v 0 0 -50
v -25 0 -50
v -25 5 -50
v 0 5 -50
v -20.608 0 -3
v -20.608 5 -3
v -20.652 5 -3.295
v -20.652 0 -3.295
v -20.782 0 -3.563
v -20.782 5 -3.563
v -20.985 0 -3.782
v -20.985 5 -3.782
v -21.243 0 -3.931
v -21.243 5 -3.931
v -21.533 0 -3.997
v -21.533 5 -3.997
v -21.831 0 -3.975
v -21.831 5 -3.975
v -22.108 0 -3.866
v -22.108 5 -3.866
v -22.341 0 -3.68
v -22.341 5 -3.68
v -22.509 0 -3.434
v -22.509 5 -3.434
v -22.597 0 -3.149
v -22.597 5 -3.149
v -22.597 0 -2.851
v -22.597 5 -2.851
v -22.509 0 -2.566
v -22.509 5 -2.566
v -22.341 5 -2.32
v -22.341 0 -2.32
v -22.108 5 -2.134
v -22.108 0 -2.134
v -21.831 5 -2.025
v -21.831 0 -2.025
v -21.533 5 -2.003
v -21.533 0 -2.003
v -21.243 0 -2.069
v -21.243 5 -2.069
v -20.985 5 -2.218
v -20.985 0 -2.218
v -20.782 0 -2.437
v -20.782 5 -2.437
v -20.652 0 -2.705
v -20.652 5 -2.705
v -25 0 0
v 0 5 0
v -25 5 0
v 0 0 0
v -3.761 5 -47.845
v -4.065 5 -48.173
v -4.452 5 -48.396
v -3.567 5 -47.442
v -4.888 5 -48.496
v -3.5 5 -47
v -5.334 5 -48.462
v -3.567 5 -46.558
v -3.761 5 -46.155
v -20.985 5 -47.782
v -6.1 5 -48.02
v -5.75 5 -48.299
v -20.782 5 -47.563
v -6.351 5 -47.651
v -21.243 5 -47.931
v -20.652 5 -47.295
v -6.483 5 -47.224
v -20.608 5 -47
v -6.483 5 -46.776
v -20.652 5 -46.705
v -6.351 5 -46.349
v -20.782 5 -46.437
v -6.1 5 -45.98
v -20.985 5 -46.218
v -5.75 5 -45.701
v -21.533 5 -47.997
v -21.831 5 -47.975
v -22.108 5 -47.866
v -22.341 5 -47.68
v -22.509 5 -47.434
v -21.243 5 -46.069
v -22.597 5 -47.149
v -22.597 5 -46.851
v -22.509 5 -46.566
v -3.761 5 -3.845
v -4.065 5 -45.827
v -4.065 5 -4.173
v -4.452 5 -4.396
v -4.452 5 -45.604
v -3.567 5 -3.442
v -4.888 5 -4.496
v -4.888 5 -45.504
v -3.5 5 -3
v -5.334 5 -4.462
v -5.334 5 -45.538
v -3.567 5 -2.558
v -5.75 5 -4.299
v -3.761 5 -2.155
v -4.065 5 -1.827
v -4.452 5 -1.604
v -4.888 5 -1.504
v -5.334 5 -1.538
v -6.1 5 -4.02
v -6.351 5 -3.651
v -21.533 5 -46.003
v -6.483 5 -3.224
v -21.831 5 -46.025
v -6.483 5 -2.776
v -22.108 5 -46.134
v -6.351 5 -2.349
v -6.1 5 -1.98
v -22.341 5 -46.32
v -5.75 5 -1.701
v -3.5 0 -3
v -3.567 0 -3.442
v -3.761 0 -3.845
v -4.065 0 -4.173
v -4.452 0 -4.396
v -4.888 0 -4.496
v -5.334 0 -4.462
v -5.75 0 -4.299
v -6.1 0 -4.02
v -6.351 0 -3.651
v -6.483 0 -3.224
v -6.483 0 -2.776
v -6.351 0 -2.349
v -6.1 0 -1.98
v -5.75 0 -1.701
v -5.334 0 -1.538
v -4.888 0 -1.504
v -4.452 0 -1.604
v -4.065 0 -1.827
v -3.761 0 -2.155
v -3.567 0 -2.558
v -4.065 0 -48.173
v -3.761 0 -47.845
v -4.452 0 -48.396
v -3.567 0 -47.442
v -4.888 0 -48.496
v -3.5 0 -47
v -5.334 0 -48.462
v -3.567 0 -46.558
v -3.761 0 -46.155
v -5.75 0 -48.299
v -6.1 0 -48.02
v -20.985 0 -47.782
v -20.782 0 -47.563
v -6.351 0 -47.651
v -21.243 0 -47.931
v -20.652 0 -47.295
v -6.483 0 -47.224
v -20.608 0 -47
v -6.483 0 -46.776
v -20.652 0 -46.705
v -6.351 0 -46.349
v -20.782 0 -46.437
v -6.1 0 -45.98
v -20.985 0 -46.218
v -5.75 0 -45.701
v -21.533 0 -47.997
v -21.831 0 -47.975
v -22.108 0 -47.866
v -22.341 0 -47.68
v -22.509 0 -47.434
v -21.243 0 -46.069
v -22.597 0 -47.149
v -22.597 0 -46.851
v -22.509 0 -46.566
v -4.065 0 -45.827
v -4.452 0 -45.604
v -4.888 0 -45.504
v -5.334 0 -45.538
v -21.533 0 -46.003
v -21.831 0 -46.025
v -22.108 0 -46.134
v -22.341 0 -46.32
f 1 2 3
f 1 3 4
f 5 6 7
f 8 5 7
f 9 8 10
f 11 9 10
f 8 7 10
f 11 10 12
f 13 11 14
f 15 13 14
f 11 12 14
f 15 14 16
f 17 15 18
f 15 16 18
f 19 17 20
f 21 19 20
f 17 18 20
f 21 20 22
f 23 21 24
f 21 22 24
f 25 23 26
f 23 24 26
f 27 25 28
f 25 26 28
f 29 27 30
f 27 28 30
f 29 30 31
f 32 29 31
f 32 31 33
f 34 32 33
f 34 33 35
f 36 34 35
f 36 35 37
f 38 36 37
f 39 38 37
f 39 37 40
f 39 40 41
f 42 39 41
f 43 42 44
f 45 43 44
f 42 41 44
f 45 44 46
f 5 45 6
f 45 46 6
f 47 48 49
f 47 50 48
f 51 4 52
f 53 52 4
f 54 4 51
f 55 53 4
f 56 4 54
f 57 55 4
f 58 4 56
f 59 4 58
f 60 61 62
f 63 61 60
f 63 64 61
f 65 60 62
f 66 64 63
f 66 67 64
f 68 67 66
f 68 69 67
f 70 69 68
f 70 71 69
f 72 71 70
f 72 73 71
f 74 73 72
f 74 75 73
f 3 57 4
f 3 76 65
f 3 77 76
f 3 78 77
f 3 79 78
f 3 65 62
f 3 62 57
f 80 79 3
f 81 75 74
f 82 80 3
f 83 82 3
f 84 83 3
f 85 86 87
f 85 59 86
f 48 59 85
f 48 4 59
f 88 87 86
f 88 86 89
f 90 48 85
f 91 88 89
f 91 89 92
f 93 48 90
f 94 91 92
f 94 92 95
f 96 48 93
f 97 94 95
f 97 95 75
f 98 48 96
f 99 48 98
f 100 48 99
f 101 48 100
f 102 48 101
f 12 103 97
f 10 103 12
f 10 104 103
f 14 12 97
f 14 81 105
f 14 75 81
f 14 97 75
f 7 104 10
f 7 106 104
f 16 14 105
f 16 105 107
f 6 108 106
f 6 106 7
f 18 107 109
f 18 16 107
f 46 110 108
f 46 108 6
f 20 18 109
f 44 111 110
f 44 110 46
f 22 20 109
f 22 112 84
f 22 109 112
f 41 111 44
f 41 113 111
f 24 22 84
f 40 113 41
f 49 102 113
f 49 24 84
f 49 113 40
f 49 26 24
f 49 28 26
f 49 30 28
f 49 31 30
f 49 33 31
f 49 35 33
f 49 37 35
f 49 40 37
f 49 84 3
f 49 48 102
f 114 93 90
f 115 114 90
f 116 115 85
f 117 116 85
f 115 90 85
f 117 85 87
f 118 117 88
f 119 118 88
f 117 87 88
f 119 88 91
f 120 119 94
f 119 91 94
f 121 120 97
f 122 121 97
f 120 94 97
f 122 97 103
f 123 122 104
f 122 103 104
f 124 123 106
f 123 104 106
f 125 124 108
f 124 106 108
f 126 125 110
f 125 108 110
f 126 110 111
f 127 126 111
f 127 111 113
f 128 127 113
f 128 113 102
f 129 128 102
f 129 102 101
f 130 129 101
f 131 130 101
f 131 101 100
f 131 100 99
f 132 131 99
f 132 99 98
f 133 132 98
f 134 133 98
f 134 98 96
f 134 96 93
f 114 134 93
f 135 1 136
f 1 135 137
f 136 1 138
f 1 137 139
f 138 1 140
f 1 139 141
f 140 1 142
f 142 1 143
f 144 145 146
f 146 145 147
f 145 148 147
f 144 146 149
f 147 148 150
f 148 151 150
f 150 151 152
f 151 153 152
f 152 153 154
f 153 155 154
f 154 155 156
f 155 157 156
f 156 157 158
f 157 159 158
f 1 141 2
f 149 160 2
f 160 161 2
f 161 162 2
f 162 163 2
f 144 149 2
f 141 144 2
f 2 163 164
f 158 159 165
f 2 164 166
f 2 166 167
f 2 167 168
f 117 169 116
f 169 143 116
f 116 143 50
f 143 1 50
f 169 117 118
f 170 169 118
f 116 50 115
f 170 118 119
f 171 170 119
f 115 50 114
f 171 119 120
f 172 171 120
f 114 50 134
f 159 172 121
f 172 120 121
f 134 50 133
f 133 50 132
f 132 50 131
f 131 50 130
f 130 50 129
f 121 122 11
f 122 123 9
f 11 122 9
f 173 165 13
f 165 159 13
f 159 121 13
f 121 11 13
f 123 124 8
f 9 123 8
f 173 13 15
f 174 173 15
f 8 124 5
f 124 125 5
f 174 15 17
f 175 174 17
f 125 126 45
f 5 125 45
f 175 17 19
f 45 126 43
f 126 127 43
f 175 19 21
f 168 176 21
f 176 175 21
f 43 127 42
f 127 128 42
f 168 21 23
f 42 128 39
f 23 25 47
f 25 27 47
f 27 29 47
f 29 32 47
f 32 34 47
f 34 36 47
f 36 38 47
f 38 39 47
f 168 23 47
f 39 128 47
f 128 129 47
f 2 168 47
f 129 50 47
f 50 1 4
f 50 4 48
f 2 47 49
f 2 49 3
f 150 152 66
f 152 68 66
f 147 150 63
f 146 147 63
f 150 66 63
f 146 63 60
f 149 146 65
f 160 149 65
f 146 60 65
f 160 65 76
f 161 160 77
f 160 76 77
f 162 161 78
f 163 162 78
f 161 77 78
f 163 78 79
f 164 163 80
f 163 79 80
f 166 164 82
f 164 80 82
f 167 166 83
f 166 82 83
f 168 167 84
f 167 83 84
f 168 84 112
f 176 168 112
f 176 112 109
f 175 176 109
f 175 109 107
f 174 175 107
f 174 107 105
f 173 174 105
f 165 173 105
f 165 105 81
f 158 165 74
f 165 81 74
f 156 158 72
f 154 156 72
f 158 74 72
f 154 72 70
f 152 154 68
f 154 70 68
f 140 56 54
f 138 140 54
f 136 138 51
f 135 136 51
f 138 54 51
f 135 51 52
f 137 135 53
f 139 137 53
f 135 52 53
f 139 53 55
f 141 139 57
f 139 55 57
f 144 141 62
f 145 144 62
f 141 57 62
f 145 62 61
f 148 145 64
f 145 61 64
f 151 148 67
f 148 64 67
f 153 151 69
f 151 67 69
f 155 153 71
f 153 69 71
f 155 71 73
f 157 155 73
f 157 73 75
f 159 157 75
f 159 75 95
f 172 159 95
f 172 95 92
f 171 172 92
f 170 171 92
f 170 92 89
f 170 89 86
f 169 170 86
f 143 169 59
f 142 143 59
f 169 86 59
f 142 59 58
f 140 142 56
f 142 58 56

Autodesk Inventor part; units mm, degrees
ref_plane "YZ Plane" through (0, 0, 0) normal (1, 0, 0) x (0, 1, 0)
ref_plane "XZ Plane" through (0, 0, 0) normal (0, 1, 0) x (-1, 0, 0)
ref_plane "XY Plane" through (0, 0, 0) normal (0, 0, 1) x (1, 0, 0)
sketch "Sketch1" plane through (0, 0, 0) normal (0, 1, 0) x (-1, 0, 0)
  line L0 (0, 0) -> (25, 0)
  line L1 (25, 0) -> (25, -50)
  line L2 (25, -50) -> (0, -50)
  line L3 (0, -50) -> (0, 0)
  dimension "d0" = 25
  dimension "d1" = 50
extrude "Extrusion1" add sketch "Sketch1" along normal blind 5
sketch "Sketch2" plane through (0, 5, 0) normal (0, 1, 0) x (1, 0, 0)
  point P0 (0, 0)
sketch "Sketch3" plane through (0, 5, 0) normal (0, 1, 0) x (1, 0, 0)
  circle A0 centre (-21.608, 3) radius 1
  circle A1 centre (-21.608, 47) radius 1
  line L0 (-25, 0) -> (0, 0) projected
  dimension "d4" = 2
  dimension "d5" = 2
  dimension "d6" = 44
  dimension "d7" = 3
extrude "Extrusion2" cut sketch "Sketch3" against normal through all
sketch "Sketch4" plane through (0, 5, 0) normal (0, 1, 0) x (1, 0, 0)
  circle A0 centre (-5, 3) radius 1.5
  circle A1 centre (-5, 47) radius 1.5
  point P0 (0, 0)
  dimension "d10" = 3
  dimension "d11" = 3
extrude "Extrusion3" cut sketch "Sketch4" against normal blind 10
properties part number "ULTREALJUD"
